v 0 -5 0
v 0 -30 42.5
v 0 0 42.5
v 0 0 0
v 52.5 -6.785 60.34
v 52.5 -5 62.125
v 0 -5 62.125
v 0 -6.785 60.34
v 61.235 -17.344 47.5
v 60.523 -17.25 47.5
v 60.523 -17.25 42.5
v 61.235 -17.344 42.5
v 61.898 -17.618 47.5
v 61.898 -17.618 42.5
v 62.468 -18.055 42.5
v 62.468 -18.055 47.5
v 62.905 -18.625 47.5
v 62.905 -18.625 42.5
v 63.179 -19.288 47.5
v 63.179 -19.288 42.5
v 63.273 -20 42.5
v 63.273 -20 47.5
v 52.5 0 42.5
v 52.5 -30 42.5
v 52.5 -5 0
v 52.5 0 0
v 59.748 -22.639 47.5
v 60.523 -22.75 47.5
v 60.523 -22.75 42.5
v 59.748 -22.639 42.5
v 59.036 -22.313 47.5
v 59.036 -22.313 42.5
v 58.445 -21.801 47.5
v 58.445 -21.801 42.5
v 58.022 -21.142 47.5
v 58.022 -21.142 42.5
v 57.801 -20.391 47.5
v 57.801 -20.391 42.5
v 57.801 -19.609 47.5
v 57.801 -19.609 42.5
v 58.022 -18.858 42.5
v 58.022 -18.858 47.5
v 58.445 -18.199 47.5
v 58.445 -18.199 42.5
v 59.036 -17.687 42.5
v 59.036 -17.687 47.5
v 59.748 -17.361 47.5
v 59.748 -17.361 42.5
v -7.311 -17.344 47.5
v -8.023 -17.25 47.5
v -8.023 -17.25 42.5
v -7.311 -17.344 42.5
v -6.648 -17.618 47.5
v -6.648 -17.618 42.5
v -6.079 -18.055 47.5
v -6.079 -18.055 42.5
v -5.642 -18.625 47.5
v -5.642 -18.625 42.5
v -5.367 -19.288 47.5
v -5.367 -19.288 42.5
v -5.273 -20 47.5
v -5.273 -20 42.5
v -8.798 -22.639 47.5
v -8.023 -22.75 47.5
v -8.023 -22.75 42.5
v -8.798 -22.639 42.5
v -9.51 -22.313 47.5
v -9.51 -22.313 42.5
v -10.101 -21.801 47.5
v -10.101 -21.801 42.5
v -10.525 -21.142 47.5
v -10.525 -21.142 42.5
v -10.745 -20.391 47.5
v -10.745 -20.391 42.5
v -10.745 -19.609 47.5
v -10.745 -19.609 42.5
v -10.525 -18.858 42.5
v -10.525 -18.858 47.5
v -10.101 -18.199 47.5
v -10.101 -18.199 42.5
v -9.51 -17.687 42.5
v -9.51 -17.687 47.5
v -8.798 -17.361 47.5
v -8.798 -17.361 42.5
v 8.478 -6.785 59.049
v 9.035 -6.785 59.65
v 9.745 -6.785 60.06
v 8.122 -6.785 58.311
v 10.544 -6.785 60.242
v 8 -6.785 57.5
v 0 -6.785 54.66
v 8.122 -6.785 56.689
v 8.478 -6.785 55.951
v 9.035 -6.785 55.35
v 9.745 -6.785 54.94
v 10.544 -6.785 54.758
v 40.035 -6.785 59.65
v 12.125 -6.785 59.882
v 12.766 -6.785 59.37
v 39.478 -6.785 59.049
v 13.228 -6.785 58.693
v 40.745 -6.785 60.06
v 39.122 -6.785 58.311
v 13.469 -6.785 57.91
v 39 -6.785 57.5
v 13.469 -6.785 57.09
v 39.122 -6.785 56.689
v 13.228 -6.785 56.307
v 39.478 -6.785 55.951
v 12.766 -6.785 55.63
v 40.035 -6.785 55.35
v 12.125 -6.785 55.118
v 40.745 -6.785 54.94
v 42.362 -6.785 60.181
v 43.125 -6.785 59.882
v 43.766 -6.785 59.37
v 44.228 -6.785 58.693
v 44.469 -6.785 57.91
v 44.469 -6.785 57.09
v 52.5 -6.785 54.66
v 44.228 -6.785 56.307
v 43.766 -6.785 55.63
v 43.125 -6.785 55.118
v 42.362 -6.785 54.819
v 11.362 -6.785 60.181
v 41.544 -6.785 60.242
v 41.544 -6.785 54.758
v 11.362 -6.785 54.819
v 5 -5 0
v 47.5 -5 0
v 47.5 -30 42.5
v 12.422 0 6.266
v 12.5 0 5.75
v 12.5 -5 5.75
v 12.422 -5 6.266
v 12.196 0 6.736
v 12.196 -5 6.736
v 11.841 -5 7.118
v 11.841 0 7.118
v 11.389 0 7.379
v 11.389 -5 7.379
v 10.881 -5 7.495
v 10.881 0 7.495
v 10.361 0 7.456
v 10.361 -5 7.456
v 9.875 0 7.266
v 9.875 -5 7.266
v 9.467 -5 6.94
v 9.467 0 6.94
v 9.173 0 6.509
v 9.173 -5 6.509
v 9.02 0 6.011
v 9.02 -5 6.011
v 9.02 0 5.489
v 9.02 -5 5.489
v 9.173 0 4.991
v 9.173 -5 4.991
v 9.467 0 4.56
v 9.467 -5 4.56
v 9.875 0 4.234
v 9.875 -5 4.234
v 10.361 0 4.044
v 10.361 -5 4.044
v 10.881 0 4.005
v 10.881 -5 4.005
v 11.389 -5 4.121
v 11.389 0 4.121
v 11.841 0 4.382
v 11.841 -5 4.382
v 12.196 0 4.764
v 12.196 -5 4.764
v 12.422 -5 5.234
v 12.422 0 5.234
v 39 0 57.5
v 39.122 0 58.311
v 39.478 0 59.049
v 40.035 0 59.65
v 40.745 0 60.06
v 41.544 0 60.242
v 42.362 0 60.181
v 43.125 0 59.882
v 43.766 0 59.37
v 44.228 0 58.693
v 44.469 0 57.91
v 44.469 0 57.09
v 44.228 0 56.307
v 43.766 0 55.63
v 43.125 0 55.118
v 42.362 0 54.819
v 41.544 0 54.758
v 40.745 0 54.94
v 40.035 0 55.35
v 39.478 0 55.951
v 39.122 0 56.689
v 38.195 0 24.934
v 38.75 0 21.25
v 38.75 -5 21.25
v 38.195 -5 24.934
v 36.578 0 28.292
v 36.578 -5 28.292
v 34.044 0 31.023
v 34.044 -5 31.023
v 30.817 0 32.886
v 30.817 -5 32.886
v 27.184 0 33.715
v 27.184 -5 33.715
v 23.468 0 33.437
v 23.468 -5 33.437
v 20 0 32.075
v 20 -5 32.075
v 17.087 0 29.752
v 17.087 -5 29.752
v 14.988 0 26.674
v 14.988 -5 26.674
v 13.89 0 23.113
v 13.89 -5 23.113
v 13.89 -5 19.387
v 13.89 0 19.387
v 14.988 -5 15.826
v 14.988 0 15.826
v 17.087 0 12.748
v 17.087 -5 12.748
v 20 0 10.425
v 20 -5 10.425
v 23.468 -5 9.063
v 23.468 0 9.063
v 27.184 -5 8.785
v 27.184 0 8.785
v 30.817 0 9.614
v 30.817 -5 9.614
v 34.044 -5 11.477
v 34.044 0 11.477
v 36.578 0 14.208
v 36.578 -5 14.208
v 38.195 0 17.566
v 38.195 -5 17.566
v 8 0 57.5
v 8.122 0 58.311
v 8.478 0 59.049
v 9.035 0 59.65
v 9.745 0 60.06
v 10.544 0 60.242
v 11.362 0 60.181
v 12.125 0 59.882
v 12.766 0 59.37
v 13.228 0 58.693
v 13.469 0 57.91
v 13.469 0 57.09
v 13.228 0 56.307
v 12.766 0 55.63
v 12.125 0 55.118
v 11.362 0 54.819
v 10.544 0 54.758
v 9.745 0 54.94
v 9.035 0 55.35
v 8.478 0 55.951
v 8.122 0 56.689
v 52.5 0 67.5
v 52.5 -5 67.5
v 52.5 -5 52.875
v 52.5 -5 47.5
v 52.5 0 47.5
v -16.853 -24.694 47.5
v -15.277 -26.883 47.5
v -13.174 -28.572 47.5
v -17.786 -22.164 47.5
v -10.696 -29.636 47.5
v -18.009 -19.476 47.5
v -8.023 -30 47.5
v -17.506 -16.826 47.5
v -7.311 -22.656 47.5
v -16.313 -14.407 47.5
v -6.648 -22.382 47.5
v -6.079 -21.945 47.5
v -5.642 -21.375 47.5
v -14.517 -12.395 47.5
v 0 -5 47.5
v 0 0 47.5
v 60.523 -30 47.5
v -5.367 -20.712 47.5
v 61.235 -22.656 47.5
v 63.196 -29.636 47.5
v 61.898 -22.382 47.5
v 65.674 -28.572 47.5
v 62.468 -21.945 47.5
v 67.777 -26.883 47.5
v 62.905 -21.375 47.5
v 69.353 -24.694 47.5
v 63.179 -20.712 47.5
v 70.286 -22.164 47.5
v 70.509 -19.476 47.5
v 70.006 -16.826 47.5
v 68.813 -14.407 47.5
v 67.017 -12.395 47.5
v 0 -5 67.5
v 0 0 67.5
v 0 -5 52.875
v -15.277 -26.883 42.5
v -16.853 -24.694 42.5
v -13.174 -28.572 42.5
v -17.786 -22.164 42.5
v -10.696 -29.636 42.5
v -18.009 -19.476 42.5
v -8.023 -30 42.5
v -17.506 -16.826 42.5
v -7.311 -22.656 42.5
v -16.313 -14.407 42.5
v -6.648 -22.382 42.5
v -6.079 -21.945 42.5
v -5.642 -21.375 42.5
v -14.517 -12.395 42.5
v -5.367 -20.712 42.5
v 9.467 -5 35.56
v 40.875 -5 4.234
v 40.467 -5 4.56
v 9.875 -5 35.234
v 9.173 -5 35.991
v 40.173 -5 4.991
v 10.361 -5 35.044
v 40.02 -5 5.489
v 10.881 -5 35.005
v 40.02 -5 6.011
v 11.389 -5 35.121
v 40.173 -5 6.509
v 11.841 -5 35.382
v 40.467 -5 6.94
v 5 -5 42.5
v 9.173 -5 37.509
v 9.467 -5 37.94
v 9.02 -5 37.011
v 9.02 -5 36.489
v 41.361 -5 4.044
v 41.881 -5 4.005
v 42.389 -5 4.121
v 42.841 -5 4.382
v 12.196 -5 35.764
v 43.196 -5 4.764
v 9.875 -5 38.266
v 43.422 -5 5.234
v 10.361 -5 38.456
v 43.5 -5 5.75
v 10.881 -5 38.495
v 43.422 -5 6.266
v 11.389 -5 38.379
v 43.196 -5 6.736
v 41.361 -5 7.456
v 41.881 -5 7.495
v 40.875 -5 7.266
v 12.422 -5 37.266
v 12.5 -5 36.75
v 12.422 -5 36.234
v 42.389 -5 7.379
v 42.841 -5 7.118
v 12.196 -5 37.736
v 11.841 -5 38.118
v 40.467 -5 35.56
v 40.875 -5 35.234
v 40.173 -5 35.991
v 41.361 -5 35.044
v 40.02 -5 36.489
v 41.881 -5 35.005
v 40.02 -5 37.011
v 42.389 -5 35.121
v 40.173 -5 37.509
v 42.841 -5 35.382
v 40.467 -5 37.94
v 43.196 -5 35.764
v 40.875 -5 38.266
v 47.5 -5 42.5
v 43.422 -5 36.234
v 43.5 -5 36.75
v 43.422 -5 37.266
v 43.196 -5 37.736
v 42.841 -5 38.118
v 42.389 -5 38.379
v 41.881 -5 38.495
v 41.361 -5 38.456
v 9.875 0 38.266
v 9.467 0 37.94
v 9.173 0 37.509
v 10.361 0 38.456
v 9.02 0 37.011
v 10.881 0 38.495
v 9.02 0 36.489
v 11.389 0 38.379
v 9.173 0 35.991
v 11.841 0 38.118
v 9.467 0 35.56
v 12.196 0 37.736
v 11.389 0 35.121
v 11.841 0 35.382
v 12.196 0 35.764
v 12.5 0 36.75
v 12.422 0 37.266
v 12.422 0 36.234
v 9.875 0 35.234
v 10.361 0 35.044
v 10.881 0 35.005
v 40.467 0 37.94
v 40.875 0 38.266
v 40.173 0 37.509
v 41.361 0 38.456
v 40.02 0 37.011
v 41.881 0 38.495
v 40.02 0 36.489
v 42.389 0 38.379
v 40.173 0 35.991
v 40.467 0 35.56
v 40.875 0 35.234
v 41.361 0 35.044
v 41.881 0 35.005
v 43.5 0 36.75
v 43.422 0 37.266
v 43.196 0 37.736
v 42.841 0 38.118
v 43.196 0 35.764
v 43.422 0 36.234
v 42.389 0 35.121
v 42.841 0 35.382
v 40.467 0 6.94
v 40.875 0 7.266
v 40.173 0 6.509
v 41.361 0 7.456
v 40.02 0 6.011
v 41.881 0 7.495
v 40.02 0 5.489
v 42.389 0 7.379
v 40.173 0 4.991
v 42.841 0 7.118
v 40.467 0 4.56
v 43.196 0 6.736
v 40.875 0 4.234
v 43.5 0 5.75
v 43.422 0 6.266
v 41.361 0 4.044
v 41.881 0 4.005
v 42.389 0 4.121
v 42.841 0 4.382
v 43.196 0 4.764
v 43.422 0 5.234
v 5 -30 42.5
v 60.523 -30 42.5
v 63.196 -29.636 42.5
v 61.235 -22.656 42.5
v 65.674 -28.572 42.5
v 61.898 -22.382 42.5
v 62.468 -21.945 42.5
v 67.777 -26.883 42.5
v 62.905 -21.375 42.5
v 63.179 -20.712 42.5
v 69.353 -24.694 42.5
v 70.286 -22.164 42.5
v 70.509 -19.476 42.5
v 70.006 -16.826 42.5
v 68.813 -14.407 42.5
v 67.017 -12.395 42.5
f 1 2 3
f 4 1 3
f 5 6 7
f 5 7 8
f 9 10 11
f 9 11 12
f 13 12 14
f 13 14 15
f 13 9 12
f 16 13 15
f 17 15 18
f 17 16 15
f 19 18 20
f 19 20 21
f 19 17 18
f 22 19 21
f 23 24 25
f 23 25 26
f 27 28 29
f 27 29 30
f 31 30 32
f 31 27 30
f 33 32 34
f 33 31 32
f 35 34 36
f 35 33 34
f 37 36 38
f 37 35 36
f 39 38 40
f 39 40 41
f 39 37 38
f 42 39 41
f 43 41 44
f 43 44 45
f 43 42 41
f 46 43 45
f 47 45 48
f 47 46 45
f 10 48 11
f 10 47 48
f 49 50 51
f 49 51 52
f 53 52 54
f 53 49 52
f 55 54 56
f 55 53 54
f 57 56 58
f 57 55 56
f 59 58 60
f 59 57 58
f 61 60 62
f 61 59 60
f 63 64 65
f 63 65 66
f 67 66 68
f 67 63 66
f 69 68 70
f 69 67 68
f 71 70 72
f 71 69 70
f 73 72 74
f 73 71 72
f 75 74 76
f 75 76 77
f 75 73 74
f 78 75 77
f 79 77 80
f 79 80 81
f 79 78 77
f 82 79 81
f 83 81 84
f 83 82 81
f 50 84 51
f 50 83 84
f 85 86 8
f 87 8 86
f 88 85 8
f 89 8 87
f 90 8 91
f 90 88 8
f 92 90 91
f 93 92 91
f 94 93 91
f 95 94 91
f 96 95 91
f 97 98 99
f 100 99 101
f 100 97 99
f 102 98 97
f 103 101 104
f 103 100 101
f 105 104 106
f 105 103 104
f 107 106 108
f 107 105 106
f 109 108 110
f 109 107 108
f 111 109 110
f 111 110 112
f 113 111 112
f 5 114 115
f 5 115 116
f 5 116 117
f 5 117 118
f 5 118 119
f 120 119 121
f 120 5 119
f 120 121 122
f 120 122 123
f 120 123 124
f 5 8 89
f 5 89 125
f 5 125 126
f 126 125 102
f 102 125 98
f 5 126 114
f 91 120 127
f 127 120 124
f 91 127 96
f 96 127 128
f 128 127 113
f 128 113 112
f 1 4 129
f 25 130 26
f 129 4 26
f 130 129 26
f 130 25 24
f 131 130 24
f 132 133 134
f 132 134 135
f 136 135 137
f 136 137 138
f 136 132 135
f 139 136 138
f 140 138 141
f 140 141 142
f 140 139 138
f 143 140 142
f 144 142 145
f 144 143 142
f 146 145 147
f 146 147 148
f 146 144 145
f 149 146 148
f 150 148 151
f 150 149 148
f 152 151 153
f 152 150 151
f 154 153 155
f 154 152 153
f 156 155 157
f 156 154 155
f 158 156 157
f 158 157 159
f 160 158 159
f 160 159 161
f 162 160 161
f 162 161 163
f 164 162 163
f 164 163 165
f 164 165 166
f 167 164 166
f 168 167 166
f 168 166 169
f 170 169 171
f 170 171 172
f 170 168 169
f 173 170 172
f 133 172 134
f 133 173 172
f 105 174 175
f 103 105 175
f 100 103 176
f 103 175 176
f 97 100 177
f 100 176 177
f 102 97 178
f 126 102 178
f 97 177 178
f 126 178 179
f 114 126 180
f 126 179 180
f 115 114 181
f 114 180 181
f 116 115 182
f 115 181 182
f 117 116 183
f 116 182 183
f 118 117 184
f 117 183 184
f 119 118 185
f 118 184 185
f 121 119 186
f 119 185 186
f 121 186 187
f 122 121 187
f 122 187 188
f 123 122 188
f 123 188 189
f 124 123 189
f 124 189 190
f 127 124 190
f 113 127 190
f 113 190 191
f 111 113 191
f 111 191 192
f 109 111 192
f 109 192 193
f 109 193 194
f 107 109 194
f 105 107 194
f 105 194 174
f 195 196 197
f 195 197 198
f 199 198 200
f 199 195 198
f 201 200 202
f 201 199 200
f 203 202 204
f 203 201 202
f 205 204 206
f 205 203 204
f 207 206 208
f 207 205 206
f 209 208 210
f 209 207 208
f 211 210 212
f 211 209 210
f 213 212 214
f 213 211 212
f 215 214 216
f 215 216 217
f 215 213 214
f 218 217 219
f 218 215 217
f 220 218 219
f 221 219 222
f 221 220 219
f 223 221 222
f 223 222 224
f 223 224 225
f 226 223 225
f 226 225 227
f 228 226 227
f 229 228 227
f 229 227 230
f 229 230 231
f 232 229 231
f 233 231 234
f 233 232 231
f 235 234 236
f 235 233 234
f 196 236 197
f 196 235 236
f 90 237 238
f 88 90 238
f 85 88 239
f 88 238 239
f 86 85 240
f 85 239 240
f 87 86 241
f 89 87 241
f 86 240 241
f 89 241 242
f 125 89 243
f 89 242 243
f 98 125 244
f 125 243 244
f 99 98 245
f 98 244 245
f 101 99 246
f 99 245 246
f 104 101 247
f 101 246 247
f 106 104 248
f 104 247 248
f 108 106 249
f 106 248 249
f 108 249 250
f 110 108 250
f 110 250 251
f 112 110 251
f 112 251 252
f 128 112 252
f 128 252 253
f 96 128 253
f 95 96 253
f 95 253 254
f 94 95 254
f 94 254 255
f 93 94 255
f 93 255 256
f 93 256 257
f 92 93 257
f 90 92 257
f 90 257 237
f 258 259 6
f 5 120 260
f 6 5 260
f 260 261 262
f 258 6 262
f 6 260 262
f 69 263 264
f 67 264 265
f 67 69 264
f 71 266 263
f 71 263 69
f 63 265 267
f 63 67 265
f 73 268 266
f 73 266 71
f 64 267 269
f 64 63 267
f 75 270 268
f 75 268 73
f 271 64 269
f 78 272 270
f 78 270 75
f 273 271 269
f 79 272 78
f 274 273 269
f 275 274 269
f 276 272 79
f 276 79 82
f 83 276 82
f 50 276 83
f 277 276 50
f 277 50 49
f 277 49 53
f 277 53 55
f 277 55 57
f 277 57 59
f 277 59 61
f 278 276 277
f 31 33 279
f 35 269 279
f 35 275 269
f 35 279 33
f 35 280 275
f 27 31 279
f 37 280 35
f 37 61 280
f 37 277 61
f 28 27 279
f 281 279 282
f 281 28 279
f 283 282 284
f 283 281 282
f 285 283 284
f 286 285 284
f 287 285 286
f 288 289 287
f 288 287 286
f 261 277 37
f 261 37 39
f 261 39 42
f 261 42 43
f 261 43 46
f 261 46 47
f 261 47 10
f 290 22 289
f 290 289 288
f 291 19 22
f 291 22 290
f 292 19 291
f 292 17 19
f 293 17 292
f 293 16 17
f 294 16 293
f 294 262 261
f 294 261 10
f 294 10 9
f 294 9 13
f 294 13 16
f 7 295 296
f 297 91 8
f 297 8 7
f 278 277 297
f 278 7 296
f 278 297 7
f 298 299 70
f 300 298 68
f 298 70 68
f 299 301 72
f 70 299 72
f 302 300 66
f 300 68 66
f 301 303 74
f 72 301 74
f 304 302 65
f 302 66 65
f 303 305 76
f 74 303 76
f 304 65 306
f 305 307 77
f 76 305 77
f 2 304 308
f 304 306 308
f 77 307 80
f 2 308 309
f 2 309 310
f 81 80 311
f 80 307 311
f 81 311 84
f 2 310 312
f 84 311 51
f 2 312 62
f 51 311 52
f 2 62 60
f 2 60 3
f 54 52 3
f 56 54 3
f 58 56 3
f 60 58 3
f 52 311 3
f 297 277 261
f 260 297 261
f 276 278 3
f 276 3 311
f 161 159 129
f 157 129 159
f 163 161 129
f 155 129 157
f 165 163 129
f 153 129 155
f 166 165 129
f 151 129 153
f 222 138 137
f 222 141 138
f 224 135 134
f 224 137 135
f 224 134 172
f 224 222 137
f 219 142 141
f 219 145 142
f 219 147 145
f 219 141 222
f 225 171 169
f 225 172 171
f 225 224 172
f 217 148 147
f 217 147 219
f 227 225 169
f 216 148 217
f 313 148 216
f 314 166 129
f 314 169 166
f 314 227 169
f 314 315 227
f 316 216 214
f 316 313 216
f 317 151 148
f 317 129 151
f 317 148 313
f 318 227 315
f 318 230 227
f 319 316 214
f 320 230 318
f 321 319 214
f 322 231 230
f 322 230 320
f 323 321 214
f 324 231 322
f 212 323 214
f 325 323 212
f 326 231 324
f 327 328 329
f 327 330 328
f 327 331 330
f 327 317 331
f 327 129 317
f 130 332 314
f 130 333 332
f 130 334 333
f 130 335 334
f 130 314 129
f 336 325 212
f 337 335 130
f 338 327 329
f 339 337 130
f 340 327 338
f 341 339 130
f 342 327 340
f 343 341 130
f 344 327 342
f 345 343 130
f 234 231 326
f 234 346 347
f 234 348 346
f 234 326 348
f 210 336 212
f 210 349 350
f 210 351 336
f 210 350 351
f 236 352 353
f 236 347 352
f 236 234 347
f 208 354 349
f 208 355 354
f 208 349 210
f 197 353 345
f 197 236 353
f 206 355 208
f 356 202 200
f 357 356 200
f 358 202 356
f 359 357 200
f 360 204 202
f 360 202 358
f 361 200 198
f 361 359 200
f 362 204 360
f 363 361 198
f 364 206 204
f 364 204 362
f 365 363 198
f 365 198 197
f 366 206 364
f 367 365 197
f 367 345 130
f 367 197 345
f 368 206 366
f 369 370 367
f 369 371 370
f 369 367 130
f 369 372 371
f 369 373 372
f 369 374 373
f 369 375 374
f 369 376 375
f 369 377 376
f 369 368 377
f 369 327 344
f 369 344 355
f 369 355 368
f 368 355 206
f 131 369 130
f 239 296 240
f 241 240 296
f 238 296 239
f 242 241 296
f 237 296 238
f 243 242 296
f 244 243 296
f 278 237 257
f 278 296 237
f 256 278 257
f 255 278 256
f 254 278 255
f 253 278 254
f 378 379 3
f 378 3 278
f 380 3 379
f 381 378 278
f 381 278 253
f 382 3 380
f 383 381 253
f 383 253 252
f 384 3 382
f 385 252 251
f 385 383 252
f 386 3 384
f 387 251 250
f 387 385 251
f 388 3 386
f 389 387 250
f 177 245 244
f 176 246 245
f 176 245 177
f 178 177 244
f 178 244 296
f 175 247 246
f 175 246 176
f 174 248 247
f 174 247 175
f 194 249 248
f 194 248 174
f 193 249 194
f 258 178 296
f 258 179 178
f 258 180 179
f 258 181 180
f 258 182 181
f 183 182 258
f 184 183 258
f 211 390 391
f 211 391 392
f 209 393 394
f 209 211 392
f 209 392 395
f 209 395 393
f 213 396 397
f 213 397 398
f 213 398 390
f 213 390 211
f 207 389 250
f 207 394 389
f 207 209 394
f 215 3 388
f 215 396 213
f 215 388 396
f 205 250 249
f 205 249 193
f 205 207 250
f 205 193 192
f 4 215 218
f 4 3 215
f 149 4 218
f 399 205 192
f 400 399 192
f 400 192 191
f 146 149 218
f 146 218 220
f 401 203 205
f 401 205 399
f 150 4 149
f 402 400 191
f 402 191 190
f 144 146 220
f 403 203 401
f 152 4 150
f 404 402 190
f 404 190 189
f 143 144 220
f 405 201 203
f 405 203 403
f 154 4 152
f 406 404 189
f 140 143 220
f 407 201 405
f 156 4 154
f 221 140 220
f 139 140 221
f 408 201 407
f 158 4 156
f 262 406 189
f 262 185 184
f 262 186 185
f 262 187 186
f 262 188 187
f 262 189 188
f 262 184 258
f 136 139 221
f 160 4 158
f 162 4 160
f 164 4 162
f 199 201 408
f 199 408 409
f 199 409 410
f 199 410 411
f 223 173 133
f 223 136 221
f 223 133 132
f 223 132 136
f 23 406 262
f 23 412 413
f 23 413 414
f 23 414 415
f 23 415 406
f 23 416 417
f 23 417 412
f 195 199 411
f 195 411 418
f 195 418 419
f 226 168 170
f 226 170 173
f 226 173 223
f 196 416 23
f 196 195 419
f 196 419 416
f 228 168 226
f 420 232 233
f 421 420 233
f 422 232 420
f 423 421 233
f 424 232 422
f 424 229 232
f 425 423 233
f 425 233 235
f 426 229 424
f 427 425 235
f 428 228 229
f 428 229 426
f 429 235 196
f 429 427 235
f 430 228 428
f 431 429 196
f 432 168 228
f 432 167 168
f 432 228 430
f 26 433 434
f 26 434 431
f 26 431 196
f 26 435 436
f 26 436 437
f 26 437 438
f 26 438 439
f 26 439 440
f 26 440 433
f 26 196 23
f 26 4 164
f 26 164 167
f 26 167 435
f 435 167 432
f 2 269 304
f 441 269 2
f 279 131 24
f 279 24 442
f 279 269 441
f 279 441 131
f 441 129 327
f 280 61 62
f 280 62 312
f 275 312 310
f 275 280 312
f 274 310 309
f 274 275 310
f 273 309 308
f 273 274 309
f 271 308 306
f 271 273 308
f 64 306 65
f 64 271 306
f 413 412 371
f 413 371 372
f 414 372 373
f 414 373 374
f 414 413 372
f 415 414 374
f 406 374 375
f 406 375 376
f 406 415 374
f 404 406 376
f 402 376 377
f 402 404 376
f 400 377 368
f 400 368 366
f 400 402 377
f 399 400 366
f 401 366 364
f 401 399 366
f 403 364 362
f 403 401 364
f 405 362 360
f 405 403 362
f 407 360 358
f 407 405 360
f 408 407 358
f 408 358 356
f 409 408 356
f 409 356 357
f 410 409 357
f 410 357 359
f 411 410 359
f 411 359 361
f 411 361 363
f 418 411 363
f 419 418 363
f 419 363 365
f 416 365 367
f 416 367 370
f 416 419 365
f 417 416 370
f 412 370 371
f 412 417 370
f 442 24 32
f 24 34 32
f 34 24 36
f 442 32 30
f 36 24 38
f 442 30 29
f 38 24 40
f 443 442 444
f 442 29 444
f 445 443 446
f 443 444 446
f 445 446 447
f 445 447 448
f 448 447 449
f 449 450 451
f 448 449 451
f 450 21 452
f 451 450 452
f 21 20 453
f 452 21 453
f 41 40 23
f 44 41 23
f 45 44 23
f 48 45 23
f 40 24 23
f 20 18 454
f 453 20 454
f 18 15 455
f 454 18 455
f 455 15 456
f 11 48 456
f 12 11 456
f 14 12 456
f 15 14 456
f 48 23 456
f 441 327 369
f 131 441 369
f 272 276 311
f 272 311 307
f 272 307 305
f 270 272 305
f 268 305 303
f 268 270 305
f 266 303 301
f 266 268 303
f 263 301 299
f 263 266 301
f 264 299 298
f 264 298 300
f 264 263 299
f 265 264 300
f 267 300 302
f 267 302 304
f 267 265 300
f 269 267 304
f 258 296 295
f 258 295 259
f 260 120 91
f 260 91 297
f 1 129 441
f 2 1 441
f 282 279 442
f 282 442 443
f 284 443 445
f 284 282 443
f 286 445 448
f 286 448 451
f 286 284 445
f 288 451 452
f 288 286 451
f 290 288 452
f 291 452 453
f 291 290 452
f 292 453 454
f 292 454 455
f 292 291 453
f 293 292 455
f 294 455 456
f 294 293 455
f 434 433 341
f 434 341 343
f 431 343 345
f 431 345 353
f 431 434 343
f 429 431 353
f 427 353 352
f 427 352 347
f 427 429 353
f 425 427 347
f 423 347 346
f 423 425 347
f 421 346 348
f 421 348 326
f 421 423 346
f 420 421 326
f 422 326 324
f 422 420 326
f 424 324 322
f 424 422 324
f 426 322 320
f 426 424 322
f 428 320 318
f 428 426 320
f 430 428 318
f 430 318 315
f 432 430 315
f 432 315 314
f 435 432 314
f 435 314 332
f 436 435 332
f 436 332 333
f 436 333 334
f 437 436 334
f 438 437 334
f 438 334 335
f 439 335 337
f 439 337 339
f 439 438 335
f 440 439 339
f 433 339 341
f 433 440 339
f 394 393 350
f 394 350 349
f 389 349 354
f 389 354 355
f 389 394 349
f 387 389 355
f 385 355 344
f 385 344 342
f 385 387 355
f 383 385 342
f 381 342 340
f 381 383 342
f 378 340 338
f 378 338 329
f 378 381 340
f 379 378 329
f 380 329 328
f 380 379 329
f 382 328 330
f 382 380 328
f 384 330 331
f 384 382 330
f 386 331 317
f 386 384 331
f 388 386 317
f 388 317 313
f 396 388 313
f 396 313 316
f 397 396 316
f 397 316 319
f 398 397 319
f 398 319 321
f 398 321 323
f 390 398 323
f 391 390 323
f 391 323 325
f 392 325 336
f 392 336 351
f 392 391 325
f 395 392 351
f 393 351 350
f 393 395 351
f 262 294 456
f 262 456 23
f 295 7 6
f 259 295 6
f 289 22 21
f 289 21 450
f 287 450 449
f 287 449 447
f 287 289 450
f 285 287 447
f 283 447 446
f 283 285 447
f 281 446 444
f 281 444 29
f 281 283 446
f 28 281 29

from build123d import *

# Parameters (mm, degrees)
F0_W      = 52.5
F0_H      = 47.5
F0_R      = 1.75
F0_R_2    = 12.5
F1_DEPTH  = 5
F3_DEPTH  = 25
F4_W      = 52.5
F4_H      = 5
F5_DEPTH  = 20
F7_DEPTH  = 5
F9_DEPTH  = 52.5
F10_R     = 2.75
F11_DEPTH = 30.001
F13_DEPTH = 52.5


with BuildPart() as f1:
    # F0 (on Front) → F1 (new body)
    with BuildSketch(Plane.XZ):
        with Locations((26.25, 23.75)):
            Rectangle(F0_W, F0_H)
        with Locations((10.75, 5.75)):
            Circle(F0_R, mode=Mode.SUBTRACT)
        with Locations((41.75, 5.75)):
            Circle(F0_R, mode=Mode.SUBTRACT)
        with Locations((26.25, 21.25)):
            Circle(F0_R_2, mode=Mode.SUBTRACT)
        with Locations((10.75, 36.75)):
            Circle(F0_R, mode=Mode.SUBTRACT)
        with Locations((41.75, 36.75)):
            Circle(F0_R, mode=Mode.SUBTRACT)
    extrude(amount=F1_DEPTH)

    # F2 (on face) → F3 (join)
    with BuildSketch(Plane.XZ.offset(5)):
        Polygon((0, 47.5), (0, 0), (5, 0), (5, 42.5), (47.5, 42.5), (47.5, 0), (52.5, 0), (52.5, 47.5), align=None)
    extrude(amount=F3_DEPTH)

    # F4 (on face) → F5 (join)
    with BuildSketch(Plane.XY.offset(47.5)):
        with Locations((26.25, -2.5)):
            Rectangle(F4_W, F4_H)
    extrude(amount=F5_DEPTH)

    # F6 (on face) → F7 (join)
    with BuildSketch(Plane.XY.offset(47.5)):
        with BuildLine():
            Line((0, 0), (-14.516609, -12.395098))
            ThreePointArc((-14.516609, -12.395098), (-17.405253, -23.460562), (-8.023115, -30))
            Line((-8.023115, -30), (0, -30))
            Line((0, -30), (0, 0))
        make_face()
        with BuildLine():
            ThreePointArc((-8.023115, -17.25), (-6.078571, -18.055456), (-5.273115, -20))
            ThreePointArc((-5.273115, -20), (-6.078571, -21.944544), (-8.023115, -22.75))
            ThreePointArc((-8.023115, -22.75), (-10.773115, -20), (-8.023115, -17.25))
        make_face(mode=Mode.SUBTRACT)
        with BuildLine():
            ThreePointArc((60.523115, -30), (69.905253, -23.460562), (67.016609, -12.395098))
            Line((67.016609, -12.395098), (52.5, 0))
            Line((52.5, 0), (52.5, -30))
            Line((52.5, -30), (60.523115, -30))
        make_face()
        with BuildLine():
            ThreePointArc((60.523115, -22.75), (57.773115, -20), (60.523115, -17.25))
            ThreePointArc((60.523115, -17.25), (62.467659, -18.055456), (63.273115, -20))
            ThreePointArc((63.273115, -20), (62.467659, -21.944544), (60.523115, -22.75))
        make_face(mode=Mode.SUBTRACT)
    extrude(amount=-F7_DEPTH)

    # F8 (on face) → F9 (join, through all)
    with BuildSketch(Plane.YZ.offset(52.5)):
        Polygon((-6.785, 54.66), (-5, 52.875), (-5, 62.125), (-6.785, 60.34), align=None)
    extrude(amount=-F9_DEPTH)

    # F10 (on face) → F11 (cut, through all)
    with BuildSketch(Plane(origin=(0, 0, 0), x_dir=(-1, 0, 0), z_dir=(0, 1, 0))):
        with Locations((-41.75, 57.5)):
            Circle(F10_R)
        with Locations((-10.75, 57.5)):
            Circle(F10_R)
    extrude(amount=-F11_DEPTH, mode=Mode.SUBTRACT)

    # F12 (on face) → F13 (cut, through all)
    with BuildSketch(Plane.YZ.offset(52.5)):
        Polygon((-5, 0), (-30, 42.5), (-30, 0), align=None)
    extrude(amount=-F13_DEPTH, mode=Mode.SUBTRACT)


solid = f1.part
